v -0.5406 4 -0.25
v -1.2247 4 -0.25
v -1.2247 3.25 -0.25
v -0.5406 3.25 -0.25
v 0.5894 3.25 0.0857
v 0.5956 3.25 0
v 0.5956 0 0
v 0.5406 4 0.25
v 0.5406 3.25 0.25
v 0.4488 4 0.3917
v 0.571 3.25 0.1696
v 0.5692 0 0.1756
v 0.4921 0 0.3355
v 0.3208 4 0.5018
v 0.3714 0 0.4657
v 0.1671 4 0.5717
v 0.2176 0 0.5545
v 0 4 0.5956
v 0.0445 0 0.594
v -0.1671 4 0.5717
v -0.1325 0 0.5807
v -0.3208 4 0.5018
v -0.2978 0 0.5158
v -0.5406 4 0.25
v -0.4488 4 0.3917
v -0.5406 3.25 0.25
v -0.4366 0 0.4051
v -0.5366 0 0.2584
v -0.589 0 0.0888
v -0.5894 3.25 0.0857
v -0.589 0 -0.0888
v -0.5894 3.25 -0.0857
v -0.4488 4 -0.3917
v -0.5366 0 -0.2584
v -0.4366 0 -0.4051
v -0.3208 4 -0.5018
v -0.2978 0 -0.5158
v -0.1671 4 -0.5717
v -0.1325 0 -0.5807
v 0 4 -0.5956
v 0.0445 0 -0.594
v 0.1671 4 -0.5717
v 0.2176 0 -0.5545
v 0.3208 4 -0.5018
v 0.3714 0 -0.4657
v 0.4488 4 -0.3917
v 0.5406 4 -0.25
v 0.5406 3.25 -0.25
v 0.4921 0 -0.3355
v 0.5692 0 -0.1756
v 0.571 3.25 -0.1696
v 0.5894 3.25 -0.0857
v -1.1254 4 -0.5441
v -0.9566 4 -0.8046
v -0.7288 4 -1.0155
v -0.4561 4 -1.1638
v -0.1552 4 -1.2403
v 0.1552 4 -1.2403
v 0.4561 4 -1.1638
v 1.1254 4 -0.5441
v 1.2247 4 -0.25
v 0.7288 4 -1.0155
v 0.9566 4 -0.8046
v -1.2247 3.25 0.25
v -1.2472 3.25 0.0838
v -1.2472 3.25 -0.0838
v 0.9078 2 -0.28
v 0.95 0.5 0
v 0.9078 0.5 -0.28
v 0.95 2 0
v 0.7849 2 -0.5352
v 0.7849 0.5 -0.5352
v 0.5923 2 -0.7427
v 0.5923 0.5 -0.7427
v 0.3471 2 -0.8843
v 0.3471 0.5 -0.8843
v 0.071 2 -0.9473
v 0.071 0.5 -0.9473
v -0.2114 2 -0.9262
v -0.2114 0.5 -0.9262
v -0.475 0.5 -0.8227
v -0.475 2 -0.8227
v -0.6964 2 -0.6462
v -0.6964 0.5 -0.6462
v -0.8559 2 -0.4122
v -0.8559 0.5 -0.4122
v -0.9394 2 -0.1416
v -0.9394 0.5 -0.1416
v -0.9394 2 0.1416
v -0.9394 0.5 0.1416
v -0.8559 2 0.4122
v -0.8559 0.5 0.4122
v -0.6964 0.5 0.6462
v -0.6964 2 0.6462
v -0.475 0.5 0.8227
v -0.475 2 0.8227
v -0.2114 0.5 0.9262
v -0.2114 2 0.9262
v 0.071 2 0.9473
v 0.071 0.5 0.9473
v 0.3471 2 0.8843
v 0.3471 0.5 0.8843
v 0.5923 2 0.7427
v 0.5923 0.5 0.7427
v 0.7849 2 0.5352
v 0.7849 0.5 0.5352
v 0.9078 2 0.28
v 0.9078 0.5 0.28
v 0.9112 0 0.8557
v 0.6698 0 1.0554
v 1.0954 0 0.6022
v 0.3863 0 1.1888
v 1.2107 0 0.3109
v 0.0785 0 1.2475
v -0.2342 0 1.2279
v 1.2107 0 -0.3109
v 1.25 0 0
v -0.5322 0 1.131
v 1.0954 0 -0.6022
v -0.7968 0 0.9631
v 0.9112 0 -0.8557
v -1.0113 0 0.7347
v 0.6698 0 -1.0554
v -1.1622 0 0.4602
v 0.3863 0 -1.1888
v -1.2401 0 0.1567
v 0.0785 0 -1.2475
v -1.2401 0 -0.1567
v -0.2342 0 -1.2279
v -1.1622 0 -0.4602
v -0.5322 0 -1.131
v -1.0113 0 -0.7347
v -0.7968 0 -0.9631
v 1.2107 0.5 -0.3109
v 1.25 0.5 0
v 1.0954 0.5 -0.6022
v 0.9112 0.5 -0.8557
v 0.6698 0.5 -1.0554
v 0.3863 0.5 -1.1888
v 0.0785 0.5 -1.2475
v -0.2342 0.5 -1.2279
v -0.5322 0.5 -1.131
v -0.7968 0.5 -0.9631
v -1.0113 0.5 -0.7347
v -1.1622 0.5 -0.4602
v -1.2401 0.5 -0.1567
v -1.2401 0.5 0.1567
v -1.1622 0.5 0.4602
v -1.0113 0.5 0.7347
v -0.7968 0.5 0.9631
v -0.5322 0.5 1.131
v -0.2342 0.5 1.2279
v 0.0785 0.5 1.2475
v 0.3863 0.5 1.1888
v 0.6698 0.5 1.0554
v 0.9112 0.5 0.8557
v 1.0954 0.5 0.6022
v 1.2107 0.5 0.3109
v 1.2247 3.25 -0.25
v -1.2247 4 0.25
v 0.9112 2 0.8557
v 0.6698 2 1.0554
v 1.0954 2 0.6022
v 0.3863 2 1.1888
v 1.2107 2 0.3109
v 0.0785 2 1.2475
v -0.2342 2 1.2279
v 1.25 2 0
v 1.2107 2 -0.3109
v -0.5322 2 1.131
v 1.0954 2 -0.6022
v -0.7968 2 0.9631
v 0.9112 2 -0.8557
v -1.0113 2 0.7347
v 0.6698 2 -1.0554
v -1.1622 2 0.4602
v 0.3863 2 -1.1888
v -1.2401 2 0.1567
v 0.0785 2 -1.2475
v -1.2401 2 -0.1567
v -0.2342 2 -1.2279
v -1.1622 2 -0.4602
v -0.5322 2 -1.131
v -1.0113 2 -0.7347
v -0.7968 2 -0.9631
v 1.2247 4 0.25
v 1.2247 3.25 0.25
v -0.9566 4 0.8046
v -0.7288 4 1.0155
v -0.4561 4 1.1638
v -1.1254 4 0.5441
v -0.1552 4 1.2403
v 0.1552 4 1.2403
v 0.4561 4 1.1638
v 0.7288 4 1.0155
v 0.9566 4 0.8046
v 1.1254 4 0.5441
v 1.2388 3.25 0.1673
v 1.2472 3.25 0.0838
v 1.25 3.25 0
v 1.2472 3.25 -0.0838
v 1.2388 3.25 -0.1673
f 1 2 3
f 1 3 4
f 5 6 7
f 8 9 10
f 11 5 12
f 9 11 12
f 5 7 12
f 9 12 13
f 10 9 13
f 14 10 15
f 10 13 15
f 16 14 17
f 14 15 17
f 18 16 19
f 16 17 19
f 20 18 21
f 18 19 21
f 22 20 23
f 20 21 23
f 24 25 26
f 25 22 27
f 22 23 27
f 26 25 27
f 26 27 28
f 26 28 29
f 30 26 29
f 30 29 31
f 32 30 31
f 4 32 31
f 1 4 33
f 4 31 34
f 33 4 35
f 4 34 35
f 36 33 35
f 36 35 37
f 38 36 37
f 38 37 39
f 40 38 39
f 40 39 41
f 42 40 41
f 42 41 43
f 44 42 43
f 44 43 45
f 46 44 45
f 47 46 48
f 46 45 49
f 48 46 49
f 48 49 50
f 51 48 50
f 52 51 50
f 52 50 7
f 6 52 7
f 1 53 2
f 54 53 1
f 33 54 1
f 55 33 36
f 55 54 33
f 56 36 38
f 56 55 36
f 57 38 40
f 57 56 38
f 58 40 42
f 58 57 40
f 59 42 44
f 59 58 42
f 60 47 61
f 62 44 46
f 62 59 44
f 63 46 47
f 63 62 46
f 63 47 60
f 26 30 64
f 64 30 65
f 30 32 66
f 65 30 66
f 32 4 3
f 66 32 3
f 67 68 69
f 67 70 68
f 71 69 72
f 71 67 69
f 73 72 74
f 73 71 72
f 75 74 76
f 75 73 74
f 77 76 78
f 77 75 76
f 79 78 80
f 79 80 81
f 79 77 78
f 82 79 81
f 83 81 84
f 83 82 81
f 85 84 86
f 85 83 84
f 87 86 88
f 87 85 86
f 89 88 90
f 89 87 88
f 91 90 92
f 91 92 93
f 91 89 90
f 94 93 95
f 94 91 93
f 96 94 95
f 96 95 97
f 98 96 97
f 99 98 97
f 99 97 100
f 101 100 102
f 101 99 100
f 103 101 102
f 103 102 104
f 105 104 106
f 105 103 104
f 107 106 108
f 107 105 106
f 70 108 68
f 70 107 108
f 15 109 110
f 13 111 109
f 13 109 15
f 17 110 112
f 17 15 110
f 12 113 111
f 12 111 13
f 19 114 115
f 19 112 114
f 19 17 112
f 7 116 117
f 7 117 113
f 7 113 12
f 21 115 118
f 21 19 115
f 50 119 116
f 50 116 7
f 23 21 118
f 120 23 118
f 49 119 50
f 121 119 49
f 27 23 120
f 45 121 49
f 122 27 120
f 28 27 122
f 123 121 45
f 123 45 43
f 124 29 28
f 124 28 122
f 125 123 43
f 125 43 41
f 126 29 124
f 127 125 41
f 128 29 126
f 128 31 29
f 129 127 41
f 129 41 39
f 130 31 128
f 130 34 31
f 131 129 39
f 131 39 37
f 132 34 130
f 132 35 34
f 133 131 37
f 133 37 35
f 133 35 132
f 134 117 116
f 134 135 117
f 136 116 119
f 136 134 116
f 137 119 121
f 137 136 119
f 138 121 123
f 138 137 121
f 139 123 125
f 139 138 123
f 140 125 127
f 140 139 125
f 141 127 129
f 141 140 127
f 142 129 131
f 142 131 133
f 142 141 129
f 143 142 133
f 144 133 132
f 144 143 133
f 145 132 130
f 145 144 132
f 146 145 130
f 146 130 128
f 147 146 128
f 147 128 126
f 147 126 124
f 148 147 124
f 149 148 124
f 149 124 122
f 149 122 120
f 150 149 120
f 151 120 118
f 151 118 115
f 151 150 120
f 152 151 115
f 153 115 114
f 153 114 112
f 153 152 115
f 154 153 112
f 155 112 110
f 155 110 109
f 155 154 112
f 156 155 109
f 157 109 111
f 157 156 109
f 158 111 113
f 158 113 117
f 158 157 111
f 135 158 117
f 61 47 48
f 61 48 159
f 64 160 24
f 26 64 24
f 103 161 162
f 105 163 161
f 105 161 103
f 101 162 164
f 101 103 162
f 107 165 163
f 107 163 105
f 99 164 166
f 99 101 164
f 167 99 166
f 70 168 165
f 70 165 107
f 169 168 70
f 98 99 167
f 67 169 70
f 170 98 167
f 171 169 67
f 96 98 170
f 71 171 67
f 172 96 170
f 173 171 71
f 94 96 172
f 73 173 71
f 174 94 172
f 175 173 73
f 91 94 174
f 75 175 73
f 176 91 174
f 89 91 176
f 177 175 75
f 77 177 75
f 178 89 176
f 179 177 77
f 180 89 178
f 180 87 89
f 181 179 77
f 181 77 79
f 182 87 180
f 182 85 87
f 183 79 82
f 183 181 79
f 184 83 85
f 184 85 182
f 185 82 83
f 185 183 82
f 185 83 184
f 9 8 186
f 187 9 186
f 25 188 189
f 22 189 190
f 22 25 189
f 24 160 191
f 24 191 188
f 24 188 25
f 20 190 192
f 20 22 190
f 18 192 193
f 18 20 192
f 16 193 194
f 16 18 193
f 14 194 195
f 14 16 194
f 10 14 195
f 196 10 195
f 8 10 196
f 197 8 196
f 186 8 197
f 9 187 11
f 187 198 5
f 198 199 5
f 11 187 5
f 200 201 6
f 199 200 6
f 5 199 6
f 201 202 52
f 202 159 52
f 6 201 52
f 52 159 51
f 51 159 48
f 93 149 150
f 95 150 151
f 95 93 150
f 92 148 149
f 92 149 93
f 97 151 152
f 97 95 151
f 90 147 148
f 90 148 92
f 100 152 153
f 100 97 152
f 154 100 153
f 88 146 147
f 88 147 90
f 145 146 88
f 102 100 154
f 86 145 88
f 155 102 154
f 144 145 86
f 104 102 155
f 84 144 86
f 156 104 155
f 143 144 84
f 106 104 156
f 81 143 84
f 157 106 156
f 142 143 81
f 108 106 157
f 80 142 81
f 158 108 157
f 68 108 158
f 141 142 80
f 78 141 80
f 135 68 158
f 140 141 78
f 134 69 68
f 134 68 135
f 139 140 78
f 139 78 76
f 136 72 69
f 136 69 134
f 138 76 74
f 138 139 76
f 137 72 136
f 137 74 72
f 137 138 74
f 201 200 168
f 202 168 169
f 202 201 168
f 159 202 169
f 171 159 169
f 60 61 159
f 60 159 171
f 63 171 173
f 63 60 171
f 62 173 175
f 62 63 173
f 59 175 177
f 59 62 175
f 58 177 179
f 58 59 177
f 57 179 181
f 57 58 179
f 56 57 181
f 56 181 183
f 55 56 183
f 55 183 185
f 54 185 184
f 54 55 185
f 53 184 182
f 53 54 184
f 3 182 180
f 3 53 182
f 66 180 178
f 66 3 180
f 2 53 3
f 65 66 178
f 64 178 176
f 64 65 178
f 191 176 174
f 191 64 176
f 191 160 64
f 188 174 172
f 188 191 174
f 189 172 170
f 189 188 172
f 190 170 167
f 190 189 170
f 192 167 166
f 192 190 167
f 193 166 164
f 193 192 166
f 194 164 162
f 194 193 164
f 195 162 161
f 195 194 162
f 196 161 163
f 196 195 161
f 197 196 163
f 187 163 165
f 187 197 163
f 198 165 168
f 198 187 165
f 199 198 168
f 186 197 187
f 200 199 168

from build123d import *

# Parameters (mm, degrees)
CUT_EXTRUDE1_DEPTH = 0.75
SKETCH3_R          = 0.59563
CUT_EXTRUDE2_DEPTH = 5


with BuildPart() as part:
    # Sketch1 → Revolve1 (revolve)
    with BuildSketch(Plane.XY):
        Polygon((0, 0), (1.25, 0), (1.25, 0.5), (0.95, 0.5), (0.95, 2), (1.25, 2), (1.25, 4), (0, 4), align=None)
    revolve(axis=Axis((0, 0, 0), (0, 1, 0)))

    # Sketch2 → Cut-Extrude1 (cut)
    with BuildSketch(Plane(origin=(0, 4, 0), x_dir=(1, 0, 0), z_dir=(0, 1, 0))):
        Polygon((0, -0.25), (-1.5, -0.25), (-1.5, 0.25), (1.5, 0.25), (1.5, -0.25), align=None)
    extrude(amount=-CUT_EXTRUDE1_DEPTH, mode=Mode.SUBTRACT)

    # Sketch3 → Cut-Extrude2 (cut, through all)
    with BuildSketch(Plane.XZ):
        Circle(SKETCH3_R)
    extrude(amount=-CUT_EXTRUDE2_DEPTH, mode=Mode.SUBTRACT)


solid = part.part
